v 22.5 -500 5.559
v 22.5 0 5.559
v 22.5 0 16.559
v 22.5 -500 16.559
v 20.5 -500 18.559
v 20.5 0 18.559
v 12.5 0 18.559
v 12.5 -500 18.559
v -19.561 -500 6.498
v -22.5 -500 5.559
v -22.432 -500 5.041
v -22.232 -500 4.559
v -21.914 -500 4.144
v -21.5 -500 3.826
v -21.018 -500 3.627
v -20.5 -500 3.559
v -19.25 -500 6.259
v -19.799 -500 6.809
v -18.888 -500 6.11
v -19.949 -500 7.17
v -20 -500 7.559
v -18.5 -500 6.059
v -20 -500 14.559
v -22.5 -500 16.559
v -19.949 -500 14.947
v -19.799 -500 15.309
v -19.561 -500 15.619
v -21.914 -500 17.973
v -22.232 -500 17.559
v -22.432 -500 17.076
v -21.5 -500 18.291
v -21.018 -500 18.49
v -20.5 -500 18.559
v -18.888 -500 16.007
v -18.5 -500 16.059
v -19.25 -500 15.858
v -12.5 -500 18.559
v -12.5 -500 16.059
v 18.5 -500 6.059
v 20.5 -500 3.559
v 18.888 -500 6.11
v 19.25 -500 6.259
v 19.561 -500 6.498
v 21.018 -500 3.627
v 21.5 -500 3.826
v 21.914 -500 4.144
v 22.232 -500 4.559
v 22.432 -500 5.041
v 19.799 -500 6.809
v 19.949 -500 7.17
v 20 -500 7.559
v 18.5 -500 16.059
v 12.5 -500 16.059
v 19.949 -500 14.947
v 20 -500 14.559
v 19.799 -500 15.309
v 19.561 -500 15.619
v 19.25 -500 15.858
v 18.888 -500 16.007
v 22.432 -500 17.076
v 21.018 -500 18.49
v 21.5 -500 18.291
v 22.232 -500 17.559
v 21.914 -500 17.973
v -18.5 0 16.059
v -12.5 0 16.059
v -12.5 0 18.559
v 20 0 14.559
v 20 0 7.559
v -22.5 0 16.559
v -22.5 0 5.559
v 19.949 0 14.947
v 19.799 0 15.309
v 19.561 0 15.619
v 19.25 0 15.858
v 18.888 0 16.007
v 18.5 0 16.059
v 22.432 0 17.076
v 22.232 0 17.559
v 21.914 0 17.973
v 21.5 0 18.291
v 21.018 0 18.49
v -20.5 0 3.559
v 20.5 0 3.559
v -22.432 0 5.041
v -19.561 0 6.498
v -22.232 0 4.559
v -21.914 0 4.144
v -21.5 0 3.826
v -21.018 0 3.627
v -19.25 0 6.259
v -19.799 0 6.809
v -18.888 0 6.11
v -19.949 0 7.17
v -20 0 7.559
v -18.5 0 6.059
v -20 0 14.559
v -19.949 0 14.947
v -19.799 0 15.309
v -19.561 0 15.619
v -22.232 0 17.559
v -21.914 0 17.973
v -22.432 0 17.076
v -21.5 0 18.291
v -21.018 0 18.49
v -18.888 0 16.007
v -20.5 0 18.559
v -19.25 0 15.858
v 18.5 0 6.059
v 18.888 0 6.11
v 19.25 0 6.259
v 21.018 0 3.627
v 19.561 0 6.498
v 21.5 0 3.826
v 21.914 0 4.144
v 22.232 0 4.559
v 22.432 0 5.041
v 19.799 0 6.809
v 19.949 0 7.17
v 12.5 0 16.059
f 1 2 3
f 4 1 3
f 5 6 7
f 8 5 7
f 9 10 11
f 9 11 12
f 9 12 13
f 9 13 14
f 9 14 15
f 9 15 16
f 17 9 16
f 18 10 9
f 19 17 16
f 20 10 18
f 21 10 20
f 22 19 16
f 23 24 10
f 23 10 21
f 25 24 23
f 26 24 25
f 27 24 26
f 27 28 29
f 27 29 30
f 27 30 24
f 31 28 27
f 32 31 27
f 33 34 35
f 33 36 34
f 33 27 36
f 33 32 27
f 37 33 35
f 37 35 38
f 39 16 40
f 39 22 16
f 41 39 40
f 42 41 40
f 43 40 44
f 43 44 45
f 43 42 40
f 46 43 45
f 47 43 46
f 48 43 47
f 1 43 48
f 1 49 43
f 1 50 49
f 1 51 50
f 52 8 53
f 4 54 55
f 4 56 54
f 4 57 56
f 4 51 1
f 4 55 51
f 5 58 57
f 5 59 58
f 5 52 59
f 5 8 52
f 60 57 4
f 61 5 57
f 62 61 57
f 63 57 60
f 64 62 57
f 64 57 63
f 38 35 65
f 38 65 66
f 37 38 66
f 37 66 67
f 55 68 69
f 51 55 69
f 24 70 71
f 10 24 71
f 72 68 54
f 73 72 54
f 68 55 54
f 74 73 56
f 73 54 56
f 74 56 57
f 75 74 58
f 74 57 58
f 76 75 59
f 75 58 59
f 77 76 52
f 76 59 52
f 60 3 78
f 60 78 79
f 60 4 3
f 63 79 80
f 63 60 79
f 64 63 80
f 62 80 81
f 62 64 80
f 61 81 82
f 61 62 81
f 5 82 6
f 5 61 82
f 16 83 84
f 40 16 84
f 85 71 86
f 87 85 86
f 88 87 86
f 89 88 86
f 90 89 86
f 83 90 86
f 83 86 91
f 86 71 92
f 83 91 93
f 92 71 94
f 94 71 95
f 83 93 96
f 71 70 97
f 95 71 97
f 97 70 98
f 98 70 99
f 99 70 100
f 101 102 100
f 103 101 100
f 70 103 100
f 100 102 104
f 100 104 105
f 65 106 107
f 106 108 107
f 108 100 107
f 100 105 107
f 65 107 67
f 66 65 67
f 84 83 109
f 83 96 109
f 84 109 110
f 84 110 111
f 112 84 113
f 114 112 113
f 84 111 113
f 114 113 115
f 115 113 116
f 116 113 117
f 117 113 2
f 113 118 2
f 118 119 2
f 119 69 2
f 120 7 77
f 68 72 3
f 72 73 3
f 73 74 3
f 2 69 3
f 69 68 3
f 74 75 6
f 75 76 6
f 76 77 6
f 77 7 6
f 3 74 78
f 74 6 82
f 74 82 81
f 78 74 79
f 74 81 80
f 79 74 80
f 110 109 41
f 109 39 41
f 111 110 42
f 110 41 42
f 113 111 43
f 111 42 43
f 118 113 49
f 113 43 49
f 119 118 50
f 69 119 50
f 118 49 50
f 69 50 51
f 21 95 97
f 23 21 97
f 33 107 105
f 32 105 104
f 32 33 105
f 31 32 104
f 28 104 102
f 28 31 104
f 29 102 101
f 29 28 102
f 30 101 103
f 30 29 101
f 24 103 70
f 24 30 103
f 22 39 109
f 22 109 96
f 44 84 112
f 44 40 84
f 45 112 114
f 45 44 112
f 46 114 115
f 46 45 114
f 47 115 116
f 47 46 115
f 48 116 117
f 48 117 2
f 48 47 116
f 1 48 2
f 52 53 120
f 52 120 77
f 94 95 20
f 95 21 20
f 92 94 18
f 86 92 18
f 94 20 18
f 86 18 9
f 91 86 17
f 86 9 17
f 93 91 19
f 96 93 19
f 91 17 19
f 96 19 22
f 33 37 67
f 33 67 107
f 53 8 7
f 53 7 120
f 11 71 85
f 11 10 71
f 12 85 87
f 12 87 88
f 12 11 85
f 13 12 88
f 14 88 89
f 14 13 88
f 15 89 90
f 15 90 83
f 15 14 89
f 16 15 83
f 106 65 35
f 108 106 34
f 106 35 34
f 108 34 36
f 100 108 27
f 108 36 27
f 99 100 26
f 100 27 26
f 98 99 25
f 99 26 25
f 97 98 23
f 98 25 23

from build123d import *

# Parameters (mm, degrees)
F1_DEPTH = 500
F2_R     = 2
F3_R     = 1.5
F4_R     = 1.5


with BuildPart() as f1:
    # F0 (on Front) → F1 (new body)
    with BuildSketch(Plane.XZ):
        Polygon((-12.5, 18.558511), (-22.5, 18.558511), (-22.5, 3.558511), (22.5, 3.558511), (22.5, 18.558511), (12.5, 18.558511), (12.5, 16.058511), (20, 16.058511), (20, 6.058511), (-20, 6.058511), (-20, 16.058511), (-12.5, 16.058511), align=None)
    extrude(amount=F1_DEPTH)

    # F2
    f2_edges = [f1.edges().sort_by_distance(p)[0] for p in [
        (22.5, -250, 18.558511),
        (-22.5, -250, 18.558511),
        (-22.5, -250, 3.558511),
        (22.5, -250, 3.558511),
    ]]
    fillet(f2_edges, radius=F2_R)

    # F3
    f3_edges = [f1.edges().sort_by_distance(p)[0] for p in [
        (20, -250, 16.058511),
        (-20, -250, 16.058511),
    ]]
    fillet(f3_edges, radius=F3_R)

    # F4
    f4_edges = [f1.edges().sort_by_distance(p)[0] for p in [
        (-20, -250, 6.058511),
        (20, -250, 6.058511),
    ]]
    fillet(f4_edges, radius=F4_R)


solid = f1.part
